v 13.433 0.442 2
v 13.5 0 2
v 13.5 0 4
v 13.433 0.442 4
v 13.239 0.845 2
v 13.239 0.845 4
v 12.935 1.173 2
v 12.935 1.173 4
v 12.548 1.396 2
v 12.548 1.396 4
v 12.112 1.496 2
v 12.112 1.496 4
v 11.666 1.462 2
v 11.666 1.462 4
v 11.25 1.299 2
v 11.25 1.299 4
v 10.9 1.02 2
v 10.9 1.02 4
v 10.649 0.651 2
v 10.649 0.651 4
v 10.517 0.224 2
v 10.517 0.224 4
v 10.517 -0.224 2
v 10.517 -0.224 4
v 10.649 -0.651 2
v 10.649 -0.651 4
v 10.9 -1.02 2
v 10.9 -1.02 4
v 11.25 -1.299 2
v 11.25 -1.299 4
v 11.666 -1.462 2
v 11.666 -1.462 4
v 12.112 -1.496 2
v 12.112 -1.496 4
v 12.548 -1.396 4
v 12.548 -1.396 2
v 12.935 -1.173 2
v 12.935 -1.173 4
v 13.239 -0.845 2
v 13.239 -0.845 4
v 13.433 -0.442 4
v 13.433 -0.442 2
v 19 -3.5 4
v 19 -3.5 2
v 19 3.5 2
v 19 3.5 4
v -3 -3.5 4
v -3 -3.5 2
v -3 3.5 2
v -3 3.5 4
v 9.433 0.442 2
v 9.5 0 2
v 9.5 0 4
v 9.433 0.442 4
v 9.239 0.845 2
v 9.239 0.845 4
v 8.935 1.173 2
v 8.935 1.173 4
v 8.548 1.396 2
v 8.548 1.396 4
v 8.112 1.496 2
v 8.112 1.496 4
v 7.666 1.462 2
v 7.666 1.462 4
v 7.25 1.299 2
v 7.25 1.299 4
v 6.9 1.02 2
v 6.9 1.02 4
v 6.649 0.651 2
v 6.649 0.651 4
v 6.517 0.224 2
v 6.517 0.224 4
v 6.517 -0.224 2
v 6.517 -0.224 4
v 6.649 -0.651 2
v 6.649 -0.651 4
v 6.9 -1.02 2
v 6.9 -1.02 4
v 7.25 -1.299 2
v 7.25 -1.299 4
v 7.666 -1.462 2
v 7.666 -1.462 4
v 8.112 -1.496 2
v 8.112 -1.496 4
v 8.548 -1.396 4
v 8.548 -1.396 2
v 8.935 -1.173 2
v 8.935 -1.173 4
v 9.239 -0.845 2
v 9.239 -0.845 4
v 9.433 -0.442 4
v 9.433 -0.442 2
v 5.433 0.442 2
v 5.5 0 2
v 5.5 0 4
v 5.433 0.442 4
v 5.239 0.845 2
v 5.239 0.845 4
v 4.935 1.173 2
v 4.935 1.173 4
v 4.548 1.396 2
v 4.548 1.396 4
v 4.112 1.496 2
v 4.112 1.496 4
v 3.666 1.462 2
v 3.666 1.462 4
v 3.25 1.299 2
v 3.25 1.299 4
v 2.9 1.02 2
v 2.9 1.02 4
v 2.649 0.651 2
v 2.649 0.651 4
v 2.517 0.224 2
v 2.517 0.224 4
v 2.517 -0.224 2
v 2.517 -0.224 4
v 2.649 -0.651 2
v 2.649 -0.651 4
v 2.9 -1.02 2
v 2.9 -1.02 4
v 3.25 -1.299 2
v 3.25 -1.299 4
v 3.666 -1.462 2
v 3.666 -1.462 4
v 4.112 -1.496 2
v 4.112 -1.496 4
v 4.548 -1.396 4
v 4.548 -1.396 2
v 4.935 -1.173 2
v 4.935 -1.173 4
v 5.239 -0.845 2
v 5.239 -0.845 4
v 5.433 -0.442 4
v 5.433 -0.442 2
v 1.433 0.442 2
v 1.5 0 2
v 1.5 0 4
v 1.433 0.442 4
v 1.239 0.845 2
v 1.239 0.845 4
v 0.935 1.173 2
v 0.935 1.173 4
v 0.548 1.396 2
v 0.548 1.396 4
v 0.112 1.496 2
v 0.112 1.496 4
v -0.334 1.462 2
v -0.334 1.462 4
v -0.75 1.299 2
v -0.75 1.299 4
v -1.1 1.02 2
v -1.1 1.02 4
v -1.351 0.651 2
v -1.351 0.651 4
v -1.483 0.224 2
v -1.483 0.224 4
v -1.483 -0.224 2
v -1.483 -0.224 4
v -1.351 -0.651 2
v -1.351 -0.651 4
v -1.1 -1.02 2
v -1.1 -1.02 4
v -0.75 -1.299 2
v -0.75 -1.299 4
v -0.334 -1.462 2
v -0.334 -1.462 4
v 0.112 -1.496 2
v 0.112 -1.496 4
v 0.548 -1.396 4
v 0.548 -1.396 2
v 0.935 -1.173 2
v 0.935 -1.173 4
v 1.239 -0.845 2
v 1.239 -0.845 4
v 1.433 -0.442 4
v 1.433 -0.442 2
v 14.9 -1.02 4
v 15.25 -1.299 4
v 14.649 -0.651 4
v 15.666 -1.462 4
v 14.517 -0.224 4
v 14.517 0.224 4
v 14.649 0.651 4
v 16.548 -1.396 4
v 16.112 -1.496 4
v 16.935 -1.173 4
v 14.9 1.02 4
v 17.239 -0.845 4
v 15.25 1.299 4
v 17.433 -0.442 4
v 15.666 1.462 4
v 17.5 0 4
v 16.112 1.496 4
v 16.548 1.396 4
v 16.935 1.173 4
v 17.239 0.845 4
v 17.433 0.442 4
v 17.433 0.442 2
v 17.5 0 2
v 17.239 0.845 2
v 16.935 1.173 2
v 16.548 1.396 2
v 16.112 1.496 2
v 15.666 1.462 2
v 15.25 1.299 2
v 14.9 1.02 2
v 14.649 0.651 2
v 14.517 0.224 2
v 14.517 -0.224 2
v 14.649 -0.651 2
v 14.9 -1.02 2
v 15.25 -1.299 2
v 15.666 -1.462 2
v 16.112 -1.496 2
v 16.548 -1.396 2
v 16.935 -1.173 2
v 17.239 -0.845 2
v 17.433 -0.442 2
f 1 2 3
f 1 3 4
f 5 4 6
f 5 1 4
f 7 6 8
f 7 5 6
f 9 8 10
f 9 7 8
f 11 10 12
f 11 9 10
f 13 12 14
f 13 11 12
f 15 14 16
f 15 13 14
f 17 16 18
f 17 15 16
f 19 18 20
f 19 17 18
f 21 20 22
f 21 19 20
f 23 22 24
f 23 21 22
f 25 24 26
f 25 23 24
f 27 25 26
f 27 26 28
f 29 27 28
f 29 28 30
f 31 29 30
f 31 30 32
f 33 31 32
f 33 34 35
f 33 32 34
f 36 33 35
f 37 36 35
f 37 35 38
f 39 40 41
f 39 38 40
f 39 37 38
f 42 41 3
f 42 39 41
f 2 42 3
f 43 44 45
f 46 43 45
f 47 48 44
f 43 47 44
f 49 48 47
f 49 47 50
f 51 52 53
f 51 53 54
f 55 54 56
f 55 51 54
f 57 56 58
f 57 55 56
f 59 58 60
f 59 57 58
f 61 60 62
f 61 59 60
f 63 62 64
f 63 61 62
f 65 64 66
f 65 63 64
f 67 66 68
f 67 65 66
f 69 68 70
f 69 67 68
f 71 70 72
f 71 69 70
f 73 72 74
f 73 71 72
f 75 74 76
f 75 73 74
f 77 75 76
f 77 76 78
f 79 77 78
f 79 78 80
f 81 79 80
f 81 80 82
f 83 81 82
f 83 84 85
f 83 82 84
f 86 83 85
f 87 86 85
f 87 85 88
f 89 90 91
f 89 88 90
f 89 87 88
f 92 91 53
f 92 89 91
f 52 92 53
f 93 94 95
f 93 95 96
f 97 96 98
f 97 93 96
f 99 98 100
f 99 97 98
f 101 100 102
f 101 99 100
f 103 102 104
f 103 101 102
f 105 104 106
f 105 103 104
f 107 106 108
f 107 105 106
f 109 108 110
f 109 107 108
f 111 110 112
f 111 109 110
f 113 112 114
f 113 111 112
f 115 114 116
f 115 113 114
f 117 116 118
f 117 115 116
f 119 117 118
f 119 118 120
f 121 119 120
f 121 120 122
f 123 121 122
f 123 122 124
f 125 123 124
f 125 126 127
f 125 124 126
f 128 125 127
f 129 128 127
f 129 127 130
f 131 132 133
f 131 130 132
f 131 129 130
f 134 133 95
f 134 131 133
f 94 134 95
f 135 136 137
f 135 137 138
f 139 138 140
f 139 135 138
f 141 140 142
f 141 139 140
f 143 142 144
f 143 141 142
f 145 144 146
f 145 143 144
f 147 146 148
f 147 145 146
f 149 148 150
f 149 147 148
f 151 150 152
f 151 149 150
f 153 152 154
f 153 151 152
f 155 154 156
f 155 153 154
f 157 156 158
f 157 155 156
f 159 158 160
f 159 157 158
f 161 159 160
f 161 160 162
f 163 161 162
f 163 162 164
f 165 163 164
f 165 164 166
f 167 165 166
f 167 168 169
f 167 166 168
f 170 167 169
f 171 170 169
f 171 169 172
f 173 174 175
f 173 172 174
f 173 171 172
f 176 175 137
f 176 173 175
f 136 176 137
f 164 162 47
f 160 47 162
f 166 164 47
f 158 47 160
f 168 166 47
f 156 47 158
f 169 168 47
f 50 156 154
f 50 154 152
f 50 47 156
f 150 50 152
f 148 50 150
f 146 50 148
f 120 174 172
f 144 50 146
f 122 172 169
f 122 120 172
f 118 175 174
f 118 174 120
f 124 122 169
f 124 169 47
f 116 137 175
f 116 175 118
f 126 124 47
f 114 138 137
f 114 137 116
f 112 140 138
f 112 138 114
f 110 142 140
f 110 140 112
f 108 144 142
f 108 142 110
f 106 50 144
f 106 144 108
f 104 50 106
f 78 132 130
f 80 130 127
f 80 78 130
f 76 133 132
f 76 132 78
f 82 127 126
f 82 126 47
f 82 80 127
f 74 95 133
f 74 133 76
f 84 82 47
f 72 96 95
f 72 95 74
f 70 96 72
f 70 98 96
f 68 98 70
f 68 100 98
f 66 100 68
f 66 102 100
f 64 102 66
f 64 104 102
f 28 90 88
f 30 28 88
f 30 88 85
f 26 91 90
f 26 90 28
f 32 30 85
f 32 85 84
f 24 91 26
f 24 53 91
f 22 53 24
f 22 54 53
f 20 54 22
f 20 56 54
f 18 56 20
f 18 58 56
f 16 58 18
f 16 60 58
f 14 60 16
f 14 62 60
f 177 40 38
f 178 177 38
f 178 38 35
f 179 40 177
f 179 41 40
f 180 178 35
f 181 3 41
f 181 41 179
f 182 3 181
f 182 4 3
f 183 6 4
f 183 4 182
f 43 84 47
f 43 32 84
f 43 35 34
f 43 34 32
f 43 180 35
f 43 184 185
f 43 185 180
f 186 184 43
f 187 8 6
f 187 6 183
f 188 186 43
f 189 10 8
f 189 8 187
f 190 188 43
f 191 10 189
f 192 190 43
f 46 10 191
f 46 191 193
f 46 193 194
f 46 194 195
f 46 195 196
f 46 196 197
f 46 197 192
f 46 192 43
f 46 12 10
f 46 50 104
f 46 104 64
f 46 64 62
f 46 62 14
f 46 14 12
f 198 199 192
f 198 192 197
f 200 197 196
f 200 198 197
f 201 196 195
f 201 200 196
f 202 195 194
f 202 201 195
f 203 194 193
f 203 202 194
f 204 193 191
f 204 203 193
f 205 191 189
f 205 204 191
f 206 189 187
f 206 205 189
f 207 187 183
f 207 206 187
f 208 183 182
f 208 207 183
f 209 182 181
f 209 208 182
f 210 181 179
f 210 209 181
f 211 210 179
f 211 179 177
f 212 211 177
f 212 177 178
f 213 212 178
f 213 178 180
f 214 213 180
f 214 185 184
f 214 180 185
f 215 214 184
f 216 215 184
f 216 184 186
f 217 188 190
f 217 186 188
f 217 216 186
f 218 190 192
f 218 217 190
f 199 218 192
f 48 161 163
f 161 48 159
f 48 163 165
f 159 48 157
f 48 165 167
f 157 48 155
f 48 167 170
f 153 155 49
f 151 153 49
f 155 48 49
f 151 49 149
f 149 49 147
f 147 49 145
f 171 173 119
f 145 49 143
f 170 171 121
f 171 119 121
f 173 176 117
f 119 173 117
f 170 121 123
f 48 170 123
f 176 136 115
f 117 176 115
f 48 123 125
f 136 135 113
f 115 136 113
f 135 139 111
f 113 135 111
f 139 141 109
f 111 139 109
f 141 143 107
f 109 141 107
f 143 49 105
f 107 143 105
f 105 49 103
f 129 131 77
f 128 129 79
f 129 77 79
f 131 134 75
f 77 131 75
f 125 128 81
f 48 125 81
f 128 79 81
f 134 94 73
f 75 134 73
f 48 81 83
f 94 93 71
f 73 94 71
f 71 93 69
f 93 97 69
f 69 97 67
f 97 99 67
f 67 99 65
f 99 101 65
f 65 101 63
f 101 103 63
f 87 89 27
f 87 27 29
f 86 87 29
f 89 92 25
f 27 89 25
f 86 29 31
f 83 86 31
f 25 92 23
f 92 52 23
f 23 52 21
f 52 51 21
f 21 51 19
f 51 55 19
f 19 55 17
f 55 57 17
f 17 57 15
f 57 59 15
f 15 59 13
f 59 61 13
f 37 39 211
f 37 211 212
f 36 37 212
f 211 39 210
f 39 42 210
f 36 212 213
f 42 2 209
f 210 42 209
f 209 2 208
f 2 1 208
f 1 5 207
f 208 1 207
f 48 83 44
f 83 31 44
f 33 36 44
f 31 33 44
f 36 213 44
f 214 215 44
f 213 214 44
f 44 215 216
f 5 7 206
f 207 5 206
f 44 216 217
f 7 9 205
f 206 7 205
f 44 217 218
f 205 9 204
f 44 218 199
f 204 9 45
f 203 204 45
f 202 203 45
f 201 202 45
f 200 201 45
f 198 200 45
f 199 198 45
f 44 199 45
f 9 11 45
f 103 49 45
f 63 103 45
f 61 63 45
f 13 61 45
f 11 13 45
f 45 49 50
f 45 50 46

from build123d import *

# Parameters (mm, degrees)
CYLINDER_R     = 1.5
CYLINDER_DEPTH = 5
ARRAY_X_COUNT  = 5
ARRAY_X_PITCH  = 4
BOX_W          = 22
BOX_H          = 7
BOX_DEPTH      = 2


with BuildPart() as array:
    # Cylinder → Cylinder (new body)
    with BuildSketch(Plane.XY):
        Circle(CYLINDER_R)
    extrude(amount=CYLINDER_DEPTH)

    # Array X: Array ×5


with BuildPart() as array_1:
    add(array.part)
    with Locations(*[(i * ARRAY_X_PITCH, 0, 0) for i in range(1, ARRAY_X_COUNT)]):
        add(array.part)


with BuildPart() as cut:
    # Box → Box (new body)
    with BuildSketch(Plane(origin=(-3, -3.5, 2), x_dir=(1, 0, 0), z_dir=(0, 0, 1))):
        with Locations((11, 3.5)):
            Rectangle(BOX_W, BOX_H)
    extrude(amount=BOX_DEPTH)

    # Cut: cut Array
    add(array_1.part, mode=Mode.SUBTRACT)


solid = cut.part
